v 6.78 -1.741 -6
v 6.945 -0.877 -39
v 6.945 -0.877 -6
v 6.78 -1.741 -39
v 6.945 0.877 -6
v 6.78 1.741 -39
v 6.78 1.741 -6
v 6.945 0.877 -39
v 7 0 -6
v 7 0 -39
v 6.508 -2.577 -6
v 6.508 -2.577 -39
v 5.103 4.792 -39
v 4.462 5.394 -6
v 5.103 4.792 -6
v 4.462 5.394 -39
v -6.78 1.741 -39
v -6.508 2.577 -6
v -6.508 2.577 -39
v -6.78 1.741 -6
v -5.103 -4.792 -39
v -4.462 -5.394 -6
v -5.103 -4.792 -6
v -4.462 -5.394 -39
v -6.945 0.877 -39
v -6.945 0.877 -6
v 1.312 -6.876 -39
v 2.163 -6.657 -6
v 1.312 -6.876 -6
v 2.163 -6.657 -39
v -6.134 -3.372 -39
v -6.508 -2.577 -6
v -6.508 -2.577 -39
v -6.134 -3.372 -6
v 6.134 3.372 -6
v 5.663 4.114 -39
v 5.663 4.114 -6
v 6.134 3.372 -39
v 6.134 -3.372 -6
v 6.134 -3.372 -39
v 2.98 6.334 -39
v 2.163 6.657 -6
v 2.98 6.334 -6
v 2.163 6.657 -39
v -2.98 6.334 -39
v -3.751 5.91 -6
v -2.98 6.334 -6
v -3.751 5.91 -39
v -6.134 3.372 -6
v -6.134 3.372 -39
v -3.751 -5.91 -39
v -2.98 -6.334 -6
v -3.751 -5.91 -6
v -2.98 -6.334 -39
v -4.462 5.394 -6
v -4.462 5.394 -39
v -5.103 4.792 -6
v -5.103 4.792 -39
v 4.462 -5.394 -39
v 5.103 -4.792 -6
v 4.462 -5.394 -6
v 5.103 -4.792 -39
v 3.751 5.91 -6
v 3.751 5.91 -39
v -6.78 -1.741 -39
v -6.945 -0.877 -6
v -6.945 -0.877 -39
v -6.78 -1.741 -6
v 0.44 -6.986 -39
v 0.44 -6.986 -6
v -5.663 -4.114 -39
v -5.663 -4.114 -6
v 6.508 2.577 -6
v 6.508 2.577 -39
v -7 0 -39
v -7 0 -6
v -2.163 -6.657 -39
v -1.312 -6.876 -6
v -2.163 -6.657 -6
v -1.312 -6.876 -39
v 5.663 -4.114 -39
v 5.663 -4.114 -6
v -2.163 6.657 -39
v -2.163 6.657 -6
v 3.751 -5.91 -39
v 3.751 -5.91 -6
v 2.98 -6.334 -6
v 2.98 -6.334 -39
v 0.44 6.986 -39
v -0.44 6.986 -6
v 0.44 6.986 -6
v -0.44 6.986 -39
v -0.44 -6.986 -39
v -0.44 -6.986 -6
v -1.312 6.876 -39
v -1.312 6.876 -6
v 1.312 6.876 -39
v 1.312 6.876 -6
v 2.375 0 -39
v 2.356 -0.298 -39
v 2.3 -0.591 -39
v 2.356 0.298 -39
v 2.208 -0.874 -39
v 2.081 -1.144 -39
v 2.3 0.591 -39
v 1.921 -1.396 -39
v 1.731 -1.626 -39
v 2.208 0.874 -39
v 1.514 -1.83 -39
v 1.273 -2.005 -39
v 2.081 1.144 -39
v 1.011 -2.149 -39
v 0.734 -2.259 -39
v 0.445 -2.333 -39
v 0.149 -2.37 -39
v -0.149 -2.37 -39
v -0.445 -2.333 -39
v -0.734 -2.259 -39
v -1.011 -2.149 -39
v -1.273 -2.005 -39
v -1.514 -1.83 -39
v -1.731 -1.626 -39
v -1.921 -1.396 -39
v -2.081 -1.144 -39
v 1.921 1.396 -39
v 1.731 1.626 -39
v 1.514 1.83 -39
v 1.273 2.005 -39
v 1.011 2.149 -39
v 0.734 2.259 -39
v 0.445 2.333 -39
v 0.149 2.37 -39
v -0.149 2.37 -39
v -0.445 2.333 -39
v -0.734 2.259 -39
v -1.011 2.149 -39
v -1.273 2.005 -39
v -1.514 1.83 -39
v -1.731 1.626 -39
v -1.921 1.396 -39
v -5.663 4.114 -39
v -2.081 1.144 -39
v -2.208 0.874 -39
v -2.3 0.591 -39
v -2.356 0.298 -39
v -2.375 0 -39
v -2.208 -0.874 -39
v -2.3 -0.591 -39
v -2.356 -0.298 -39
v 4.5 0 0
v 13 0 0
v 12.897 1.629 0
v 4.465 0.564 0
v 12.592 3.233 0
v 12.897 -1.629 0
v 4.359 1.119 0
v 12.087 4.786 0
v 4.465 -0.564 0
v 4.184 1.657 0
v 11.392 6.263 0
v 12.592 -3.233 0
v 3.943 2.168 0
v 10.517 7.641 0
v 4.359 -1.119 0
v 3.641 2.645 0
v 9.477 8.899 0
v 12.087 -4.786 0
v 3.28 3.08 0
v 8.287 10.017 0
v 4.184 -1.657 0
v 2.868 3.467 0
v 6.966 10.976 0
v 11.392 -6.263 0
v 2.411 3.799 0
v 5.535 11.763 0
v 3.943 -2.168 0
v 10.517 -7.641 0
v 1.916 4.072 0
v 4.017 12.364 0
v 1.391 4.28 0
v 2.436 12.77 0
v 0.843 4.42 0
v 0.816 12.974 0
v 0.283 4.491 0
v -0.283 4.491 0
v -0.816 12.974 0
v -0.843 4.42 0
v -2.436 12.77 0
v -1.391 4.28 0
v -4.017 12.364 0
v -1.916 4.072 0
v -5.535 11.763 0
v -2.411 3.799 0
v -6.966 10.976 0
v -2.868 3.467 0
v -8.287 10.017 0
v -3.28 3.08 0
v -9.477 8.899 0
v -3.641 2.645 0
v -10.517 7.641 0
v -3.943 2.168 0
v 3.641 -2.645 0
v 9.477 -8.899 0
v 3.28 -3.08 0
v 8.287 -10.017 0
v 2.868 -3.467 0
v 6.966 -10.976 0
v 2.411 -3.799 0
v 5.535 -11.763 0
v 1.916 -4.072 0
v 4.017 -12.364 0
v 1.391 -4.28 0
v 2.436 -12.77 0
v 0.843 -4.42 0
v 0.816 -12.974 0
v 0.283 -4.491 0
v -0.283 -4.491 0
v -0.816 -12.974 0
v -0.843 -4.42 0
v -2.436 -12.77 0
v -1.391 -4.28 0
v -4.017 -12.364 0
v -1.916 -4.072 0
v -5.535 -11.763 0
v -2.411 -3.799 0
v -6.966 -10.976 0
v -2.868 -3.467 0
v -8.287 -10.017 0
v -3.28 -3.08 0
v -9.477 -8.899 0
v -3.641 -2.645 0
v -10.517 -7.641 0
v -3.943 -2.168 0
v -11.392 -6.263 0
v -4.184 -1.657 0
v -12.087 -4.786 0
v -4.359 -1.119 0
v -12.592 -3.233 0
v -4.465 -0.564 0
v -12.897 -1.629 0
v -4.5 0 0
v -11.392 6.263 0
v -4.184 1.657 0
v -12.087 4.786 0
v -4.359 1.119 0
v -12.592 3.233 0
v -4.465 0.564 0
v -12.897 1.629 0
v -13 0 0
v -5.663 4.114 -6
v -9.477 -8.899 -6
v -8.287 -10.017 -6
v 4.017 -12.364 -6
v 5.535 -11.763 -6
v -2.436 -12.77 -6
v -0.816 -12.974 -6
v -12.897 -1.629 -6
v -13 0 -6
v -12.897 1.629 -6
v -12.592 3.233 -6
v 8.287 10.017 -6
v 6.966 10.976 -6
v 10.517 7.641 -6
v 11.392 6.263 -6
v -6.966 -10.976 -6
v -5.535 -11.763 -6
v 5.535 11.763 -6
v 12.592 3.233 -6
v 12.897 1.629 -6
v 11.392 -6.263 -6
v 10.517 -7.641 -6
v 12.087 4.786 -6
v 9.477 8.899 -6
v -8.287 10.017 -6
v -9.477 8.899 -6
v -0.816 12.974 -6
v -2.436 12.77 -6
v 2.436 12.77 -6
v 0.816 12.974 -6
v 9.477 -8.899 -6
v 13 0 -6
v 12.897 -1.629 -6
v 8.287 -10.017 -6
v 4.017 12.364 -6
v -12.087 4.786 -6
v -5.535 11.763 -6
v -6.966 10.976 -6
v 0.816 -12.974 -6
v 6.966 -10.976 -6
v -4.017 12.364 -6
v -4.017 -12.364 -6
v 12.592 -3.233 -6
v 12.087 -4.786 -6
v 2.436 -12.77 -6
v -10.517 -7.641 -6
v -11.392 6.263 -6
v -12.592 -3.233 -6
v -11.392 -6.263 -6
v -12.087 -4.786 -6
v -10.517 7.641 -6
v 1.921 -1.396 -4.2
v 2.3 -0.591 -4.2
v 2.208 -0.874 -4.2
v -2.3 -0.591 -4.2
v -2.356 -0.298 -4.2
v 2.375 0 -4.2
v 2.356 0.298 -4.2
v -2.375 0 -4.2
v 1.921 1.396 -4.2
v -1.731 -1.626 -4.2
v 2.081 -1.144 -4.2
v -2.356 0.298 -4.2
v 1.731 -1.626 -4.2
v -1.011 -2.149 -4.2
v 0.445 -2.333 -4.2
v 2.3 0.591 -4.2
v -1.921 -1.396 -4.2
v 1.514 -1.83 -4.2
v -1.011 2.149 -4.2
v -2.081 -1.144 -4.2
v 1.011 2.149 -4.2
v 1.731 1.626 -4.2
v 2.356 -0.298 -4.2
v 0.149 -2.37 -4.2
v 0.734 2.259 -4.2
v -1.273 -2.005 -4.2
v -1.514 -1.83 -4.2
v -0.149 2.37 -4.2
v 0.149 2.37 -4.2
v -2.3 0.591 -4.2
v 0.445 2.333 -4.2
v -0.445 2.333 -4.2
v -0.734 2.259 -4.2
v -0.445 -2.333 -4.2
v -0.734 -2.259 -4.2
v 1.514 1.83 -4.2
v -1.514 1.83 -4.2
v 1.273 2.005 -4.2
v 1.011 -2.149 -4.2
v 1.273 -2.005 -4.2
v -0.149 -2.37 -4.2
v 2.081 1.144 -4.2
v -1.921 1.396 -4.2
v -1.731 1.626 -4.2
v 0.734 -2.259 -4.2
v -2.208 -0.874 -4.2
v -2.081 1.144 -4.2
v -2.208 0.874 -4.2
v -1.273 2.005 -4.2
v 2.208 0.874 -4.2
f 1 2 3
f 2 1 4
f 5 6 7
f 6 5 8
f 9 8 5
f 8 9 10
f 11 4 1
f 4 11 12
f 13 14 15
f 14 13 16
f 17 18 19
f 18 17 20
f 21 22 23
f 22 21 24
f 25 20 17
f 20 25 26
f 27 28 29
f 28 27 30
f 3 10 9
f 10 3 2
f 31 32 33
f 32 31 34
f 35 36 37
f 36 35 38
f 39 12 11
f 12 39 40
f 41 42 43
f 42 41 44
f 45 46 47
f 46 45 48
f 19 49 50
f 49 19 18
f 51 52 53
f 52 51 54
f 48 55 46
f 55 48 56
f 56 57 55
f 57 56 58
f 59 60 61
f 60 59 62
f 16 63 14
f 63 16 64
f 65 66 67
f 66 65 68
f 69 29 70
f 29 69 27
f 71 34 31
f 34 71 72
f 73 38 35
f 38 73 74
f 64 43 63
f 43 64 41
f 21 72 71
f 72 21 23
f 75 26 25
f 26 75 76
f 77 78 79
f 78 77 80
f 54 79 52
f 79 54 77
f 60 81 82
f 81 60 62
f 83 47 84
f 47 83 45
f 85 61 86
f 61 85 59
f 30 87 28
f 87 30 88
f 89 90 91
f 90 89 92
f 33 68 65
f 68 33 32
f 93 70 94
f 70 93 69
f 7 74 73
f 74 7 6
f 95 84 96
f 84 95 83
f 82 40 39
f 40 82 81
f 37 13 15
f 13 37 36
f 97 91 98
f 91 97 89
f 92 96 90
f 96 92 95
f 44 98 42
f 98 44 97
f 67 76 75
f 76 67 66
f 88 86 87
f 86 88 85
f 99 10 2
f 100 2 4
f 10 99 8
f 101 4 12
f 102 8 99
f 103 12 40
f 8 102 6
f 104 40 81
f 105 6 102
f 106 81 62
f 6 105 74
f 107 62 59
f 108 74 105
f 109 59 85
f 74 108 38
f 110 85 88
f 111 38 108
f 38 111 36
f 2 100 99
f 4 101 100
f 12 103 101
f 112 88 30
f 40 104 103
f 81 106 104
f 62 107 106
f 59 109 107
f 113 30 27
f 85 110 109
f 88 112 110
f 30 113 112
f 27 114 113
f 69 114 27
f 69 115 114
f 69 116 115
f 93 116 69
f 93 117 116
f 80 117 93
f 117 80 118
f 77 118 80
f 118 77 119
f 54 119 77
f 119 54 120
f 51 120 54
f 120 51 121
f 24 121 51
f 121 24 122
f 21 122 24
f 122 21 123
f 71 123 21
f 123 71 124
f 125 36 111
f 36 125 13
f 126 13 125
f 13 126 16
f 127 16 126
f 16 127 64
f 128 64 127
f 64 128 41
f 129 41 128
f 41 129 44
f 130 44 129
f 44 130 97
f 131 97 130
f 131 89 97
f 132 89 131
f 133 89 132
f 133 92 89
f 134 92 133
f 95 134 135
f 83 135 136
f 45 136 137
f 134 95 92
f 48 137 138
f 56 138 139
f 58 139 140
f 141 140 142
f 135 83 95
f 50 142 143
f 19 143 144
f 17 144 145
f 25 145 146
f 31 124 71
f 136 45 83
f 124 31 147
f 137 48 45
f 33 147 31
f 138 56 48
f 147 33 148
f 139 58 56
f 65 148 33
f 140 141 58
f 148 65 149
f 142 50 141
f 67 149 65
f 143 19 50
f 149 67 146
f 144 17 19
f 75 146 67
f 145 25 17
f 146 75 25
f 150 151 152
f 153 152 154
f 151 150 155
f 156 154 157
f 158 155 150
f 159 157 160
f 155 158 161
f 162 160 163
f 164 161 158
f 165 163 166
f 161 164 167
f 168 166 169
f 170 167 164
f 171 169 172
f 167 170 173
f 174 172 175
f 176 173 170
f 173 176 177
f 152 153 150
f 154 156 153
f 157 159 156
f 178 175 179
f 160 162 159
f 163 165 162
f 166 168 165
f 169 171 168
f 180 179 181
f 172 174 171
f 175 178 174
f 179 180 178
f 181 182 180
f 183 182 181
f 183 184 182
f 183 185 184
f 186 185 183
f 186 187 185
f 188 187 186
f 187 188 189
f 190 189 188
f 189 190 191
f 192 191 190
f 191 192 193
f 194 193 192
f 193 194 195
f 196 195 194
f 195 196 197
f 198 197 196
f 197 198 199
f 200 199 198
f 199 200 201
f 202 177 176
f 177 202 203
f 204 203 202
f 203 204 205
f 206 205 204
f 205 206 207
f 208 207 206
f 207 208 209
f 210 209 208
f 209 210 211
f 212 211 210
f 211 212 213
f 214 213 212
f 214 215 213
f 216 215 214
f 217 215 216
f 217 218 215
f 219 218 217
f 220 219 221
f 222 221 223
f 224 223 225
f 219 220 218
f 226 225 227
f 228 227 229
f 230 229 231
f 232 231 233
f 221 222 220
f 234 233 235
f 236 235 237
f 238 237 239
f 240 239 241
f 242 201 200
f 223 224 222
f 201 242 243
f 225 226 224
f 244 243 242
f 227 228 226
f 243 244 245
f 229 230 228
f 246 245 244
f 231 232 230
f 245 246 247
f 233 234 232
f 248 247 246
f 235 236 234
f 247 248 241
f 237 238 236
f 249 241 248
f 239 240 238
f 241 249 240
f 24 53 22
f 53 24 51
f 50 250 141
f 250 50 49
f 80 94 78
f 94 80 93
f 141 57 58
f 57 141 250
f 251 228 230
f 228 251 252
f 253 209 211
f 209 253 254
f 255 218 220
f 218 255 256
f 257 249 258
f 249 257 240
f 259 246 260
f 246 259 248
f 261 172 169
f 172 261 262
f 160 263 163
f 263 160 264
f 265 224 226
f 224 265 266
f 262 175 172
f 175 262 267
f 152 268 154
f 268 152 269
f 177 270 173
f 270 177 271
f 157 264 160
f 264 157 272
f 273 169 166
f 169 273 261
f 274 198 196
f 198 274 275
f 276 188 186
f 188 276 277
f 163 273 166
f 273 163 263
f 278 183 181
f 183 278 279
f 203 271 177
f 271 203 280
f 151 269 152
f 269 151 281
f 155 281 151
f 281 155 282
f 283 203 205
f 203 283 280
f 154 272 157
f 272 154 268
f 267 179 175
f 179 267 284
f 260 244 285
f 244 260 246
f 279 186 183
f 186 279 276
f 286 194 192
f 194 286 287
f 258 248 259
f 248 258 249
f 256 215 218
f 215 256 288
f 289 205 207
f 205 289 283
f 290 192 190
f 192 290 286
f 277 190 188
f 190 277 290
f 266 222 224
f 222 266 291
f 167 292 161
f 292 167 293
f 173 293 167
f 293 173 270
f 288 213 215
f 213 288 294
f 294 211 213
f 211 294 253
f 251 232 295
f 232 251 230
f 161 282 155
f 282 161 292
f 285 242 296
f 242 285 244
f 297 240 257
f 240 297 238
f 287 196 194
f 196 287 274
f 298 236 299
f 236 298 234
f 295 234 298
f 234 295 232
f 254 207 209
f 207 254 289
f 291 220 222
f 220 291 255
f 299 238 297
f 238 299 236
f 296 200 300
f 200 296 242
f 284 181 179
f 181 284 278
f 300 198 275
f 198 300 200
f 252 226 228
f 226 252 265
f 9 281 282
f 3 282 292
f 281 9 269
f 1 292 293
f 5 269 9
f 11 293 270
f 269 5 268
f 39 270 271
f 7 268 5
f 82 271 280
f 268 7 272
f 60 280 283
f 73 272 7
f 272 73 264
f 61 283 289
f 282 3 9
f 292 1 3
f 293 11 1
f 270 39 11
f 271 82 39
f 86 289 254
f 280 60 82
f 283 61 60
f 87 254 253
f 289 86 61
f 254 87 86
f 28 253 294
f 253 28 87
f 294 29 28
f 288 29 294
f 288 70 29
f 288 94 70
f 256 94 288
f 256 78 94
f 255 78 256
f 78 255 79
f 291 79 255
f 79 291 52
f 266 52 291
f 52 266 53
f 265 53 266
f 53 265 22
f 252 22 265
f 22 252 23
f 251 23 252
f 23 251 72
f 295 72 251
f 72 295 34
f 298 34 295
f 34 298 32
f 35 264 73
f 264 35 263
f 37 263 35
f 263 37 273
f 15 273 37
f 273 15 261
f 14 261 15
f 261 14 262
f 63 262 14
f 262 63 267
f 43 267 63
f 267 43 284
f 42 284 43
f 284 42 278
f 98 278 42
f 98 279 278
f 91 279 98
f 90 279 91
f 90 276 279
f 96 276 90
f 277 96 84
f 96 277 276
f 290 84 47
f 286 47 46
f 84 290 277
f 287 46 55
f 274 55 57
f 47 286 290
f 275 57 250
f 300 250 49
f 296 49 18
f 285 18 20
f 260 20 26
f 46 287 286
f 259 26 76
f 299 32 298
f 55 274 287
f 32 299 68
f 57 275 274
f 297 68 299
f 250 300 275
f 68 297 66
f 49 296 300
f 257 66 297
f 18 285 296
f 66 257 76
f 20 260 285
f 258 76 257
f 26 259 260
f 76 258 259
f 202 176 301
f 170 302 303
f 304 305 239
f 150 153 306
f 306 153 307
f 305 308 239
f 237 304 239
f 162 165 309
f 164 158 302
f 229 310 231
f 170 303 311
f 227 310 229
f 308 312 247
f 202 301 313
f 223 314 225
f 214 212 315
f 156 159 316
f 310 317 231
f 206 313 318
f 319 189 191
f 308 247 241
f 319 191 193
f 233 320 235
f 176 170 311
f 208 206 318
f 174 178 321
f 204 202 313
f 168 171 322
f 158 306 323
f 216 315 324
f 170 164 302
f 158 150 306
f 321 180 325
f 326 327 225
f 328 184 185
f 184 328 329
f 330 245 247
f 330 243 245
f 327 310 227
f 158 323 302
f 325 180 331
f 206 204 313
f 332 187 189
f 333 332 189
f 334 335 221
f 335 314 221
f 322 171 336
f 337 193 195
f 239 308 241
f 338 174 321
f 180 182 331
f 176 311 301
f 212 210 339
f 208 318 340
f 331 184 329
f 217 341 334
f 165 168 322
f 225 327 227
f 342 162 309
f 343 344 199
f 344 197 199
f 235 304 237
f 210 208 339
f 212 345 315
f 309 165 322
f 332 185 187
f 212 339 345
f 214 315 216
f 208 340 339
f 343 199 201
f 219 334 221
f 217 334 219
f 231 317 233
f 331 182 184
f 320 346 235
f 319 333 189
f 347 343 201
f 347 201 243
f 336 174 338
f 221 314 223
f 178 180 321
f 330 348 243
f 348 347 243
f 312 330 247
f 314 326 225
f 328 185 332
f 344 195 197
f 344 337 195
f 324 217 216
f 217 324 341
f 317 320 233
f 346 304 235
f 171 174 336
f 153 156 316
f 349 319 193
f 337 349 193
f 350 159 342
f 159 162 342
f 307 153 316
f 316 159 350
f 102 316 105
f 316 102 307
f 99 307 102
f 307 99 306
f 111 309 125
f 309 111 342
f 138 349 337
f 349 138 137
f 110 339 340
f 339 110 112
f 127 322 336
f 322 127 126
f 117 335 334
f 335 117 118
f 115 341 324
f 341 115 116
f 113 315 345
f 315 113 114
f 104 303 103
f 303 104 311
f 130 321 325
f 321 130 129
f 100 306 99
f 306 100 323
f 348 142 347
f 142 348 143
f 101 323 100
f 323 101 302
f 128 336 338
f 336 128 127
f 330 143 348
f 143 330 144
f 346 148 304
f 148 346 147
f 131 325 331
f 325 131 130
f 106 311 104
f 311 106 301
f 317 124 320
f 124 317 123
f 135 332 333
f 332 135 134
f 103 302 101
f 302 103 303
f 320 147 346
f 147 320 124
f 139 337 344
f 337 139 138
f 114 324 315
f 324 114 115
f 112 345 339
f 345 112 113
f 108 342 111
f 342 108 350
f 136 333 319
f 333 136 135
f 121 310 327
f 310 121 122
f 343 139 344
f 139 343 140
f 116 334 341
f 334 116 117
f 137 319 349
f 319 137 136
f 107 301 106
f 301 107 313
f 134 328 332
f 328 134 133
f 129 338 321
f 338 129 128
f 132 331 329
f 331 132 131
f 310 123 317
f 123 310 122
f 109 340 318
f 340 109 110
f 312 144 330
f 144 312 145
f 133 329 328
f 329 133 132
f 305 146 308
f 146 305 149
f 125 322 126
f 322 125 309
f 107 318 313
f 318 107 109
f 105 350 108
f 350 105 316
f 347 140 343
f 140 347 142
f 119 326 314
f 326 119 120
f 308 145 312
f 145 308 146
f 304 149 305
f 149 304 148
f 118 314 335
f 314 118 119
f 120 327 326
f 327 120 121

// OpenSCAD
$fn = 50;


difference() {
	union() {
		translate(v = [0, 0, -39.0000000000]) {
			cylinder(h = 39, r = 7.0000000000);
		}
		translate(v = [0, 0, -6.0000000000]) {
			cylinder(h = 6, r = 13.0000000000);
		}
	}
	union() {
		translate(v = [0, 0, 0]) {
			rotate(a = [0, 0, 0]) {
				difference() {
					union() {
						#translate(v = [0, 0, -39.0000000000]) {
							cylinder(h = 39, r = 2.2500000000);
						}
						#translate(v = [0, 0, -4.2000000000]) {
							cylinder(h = 4.2000000000, r = 7.0000000000, r1 = 2.3750000000, r2 = 4.5000000000);
						}
						#translate(v = [0, 0, -39.0000000000]) {
							cylinder(h = 39, r = 2.3750000000);
						}
						#translate(v = [0, 0, -39.0000000000]) {
							cylinder(h = 39, r = 2.2500000000);
						}
					}
					union();
				}
			}
		}
	}
}
